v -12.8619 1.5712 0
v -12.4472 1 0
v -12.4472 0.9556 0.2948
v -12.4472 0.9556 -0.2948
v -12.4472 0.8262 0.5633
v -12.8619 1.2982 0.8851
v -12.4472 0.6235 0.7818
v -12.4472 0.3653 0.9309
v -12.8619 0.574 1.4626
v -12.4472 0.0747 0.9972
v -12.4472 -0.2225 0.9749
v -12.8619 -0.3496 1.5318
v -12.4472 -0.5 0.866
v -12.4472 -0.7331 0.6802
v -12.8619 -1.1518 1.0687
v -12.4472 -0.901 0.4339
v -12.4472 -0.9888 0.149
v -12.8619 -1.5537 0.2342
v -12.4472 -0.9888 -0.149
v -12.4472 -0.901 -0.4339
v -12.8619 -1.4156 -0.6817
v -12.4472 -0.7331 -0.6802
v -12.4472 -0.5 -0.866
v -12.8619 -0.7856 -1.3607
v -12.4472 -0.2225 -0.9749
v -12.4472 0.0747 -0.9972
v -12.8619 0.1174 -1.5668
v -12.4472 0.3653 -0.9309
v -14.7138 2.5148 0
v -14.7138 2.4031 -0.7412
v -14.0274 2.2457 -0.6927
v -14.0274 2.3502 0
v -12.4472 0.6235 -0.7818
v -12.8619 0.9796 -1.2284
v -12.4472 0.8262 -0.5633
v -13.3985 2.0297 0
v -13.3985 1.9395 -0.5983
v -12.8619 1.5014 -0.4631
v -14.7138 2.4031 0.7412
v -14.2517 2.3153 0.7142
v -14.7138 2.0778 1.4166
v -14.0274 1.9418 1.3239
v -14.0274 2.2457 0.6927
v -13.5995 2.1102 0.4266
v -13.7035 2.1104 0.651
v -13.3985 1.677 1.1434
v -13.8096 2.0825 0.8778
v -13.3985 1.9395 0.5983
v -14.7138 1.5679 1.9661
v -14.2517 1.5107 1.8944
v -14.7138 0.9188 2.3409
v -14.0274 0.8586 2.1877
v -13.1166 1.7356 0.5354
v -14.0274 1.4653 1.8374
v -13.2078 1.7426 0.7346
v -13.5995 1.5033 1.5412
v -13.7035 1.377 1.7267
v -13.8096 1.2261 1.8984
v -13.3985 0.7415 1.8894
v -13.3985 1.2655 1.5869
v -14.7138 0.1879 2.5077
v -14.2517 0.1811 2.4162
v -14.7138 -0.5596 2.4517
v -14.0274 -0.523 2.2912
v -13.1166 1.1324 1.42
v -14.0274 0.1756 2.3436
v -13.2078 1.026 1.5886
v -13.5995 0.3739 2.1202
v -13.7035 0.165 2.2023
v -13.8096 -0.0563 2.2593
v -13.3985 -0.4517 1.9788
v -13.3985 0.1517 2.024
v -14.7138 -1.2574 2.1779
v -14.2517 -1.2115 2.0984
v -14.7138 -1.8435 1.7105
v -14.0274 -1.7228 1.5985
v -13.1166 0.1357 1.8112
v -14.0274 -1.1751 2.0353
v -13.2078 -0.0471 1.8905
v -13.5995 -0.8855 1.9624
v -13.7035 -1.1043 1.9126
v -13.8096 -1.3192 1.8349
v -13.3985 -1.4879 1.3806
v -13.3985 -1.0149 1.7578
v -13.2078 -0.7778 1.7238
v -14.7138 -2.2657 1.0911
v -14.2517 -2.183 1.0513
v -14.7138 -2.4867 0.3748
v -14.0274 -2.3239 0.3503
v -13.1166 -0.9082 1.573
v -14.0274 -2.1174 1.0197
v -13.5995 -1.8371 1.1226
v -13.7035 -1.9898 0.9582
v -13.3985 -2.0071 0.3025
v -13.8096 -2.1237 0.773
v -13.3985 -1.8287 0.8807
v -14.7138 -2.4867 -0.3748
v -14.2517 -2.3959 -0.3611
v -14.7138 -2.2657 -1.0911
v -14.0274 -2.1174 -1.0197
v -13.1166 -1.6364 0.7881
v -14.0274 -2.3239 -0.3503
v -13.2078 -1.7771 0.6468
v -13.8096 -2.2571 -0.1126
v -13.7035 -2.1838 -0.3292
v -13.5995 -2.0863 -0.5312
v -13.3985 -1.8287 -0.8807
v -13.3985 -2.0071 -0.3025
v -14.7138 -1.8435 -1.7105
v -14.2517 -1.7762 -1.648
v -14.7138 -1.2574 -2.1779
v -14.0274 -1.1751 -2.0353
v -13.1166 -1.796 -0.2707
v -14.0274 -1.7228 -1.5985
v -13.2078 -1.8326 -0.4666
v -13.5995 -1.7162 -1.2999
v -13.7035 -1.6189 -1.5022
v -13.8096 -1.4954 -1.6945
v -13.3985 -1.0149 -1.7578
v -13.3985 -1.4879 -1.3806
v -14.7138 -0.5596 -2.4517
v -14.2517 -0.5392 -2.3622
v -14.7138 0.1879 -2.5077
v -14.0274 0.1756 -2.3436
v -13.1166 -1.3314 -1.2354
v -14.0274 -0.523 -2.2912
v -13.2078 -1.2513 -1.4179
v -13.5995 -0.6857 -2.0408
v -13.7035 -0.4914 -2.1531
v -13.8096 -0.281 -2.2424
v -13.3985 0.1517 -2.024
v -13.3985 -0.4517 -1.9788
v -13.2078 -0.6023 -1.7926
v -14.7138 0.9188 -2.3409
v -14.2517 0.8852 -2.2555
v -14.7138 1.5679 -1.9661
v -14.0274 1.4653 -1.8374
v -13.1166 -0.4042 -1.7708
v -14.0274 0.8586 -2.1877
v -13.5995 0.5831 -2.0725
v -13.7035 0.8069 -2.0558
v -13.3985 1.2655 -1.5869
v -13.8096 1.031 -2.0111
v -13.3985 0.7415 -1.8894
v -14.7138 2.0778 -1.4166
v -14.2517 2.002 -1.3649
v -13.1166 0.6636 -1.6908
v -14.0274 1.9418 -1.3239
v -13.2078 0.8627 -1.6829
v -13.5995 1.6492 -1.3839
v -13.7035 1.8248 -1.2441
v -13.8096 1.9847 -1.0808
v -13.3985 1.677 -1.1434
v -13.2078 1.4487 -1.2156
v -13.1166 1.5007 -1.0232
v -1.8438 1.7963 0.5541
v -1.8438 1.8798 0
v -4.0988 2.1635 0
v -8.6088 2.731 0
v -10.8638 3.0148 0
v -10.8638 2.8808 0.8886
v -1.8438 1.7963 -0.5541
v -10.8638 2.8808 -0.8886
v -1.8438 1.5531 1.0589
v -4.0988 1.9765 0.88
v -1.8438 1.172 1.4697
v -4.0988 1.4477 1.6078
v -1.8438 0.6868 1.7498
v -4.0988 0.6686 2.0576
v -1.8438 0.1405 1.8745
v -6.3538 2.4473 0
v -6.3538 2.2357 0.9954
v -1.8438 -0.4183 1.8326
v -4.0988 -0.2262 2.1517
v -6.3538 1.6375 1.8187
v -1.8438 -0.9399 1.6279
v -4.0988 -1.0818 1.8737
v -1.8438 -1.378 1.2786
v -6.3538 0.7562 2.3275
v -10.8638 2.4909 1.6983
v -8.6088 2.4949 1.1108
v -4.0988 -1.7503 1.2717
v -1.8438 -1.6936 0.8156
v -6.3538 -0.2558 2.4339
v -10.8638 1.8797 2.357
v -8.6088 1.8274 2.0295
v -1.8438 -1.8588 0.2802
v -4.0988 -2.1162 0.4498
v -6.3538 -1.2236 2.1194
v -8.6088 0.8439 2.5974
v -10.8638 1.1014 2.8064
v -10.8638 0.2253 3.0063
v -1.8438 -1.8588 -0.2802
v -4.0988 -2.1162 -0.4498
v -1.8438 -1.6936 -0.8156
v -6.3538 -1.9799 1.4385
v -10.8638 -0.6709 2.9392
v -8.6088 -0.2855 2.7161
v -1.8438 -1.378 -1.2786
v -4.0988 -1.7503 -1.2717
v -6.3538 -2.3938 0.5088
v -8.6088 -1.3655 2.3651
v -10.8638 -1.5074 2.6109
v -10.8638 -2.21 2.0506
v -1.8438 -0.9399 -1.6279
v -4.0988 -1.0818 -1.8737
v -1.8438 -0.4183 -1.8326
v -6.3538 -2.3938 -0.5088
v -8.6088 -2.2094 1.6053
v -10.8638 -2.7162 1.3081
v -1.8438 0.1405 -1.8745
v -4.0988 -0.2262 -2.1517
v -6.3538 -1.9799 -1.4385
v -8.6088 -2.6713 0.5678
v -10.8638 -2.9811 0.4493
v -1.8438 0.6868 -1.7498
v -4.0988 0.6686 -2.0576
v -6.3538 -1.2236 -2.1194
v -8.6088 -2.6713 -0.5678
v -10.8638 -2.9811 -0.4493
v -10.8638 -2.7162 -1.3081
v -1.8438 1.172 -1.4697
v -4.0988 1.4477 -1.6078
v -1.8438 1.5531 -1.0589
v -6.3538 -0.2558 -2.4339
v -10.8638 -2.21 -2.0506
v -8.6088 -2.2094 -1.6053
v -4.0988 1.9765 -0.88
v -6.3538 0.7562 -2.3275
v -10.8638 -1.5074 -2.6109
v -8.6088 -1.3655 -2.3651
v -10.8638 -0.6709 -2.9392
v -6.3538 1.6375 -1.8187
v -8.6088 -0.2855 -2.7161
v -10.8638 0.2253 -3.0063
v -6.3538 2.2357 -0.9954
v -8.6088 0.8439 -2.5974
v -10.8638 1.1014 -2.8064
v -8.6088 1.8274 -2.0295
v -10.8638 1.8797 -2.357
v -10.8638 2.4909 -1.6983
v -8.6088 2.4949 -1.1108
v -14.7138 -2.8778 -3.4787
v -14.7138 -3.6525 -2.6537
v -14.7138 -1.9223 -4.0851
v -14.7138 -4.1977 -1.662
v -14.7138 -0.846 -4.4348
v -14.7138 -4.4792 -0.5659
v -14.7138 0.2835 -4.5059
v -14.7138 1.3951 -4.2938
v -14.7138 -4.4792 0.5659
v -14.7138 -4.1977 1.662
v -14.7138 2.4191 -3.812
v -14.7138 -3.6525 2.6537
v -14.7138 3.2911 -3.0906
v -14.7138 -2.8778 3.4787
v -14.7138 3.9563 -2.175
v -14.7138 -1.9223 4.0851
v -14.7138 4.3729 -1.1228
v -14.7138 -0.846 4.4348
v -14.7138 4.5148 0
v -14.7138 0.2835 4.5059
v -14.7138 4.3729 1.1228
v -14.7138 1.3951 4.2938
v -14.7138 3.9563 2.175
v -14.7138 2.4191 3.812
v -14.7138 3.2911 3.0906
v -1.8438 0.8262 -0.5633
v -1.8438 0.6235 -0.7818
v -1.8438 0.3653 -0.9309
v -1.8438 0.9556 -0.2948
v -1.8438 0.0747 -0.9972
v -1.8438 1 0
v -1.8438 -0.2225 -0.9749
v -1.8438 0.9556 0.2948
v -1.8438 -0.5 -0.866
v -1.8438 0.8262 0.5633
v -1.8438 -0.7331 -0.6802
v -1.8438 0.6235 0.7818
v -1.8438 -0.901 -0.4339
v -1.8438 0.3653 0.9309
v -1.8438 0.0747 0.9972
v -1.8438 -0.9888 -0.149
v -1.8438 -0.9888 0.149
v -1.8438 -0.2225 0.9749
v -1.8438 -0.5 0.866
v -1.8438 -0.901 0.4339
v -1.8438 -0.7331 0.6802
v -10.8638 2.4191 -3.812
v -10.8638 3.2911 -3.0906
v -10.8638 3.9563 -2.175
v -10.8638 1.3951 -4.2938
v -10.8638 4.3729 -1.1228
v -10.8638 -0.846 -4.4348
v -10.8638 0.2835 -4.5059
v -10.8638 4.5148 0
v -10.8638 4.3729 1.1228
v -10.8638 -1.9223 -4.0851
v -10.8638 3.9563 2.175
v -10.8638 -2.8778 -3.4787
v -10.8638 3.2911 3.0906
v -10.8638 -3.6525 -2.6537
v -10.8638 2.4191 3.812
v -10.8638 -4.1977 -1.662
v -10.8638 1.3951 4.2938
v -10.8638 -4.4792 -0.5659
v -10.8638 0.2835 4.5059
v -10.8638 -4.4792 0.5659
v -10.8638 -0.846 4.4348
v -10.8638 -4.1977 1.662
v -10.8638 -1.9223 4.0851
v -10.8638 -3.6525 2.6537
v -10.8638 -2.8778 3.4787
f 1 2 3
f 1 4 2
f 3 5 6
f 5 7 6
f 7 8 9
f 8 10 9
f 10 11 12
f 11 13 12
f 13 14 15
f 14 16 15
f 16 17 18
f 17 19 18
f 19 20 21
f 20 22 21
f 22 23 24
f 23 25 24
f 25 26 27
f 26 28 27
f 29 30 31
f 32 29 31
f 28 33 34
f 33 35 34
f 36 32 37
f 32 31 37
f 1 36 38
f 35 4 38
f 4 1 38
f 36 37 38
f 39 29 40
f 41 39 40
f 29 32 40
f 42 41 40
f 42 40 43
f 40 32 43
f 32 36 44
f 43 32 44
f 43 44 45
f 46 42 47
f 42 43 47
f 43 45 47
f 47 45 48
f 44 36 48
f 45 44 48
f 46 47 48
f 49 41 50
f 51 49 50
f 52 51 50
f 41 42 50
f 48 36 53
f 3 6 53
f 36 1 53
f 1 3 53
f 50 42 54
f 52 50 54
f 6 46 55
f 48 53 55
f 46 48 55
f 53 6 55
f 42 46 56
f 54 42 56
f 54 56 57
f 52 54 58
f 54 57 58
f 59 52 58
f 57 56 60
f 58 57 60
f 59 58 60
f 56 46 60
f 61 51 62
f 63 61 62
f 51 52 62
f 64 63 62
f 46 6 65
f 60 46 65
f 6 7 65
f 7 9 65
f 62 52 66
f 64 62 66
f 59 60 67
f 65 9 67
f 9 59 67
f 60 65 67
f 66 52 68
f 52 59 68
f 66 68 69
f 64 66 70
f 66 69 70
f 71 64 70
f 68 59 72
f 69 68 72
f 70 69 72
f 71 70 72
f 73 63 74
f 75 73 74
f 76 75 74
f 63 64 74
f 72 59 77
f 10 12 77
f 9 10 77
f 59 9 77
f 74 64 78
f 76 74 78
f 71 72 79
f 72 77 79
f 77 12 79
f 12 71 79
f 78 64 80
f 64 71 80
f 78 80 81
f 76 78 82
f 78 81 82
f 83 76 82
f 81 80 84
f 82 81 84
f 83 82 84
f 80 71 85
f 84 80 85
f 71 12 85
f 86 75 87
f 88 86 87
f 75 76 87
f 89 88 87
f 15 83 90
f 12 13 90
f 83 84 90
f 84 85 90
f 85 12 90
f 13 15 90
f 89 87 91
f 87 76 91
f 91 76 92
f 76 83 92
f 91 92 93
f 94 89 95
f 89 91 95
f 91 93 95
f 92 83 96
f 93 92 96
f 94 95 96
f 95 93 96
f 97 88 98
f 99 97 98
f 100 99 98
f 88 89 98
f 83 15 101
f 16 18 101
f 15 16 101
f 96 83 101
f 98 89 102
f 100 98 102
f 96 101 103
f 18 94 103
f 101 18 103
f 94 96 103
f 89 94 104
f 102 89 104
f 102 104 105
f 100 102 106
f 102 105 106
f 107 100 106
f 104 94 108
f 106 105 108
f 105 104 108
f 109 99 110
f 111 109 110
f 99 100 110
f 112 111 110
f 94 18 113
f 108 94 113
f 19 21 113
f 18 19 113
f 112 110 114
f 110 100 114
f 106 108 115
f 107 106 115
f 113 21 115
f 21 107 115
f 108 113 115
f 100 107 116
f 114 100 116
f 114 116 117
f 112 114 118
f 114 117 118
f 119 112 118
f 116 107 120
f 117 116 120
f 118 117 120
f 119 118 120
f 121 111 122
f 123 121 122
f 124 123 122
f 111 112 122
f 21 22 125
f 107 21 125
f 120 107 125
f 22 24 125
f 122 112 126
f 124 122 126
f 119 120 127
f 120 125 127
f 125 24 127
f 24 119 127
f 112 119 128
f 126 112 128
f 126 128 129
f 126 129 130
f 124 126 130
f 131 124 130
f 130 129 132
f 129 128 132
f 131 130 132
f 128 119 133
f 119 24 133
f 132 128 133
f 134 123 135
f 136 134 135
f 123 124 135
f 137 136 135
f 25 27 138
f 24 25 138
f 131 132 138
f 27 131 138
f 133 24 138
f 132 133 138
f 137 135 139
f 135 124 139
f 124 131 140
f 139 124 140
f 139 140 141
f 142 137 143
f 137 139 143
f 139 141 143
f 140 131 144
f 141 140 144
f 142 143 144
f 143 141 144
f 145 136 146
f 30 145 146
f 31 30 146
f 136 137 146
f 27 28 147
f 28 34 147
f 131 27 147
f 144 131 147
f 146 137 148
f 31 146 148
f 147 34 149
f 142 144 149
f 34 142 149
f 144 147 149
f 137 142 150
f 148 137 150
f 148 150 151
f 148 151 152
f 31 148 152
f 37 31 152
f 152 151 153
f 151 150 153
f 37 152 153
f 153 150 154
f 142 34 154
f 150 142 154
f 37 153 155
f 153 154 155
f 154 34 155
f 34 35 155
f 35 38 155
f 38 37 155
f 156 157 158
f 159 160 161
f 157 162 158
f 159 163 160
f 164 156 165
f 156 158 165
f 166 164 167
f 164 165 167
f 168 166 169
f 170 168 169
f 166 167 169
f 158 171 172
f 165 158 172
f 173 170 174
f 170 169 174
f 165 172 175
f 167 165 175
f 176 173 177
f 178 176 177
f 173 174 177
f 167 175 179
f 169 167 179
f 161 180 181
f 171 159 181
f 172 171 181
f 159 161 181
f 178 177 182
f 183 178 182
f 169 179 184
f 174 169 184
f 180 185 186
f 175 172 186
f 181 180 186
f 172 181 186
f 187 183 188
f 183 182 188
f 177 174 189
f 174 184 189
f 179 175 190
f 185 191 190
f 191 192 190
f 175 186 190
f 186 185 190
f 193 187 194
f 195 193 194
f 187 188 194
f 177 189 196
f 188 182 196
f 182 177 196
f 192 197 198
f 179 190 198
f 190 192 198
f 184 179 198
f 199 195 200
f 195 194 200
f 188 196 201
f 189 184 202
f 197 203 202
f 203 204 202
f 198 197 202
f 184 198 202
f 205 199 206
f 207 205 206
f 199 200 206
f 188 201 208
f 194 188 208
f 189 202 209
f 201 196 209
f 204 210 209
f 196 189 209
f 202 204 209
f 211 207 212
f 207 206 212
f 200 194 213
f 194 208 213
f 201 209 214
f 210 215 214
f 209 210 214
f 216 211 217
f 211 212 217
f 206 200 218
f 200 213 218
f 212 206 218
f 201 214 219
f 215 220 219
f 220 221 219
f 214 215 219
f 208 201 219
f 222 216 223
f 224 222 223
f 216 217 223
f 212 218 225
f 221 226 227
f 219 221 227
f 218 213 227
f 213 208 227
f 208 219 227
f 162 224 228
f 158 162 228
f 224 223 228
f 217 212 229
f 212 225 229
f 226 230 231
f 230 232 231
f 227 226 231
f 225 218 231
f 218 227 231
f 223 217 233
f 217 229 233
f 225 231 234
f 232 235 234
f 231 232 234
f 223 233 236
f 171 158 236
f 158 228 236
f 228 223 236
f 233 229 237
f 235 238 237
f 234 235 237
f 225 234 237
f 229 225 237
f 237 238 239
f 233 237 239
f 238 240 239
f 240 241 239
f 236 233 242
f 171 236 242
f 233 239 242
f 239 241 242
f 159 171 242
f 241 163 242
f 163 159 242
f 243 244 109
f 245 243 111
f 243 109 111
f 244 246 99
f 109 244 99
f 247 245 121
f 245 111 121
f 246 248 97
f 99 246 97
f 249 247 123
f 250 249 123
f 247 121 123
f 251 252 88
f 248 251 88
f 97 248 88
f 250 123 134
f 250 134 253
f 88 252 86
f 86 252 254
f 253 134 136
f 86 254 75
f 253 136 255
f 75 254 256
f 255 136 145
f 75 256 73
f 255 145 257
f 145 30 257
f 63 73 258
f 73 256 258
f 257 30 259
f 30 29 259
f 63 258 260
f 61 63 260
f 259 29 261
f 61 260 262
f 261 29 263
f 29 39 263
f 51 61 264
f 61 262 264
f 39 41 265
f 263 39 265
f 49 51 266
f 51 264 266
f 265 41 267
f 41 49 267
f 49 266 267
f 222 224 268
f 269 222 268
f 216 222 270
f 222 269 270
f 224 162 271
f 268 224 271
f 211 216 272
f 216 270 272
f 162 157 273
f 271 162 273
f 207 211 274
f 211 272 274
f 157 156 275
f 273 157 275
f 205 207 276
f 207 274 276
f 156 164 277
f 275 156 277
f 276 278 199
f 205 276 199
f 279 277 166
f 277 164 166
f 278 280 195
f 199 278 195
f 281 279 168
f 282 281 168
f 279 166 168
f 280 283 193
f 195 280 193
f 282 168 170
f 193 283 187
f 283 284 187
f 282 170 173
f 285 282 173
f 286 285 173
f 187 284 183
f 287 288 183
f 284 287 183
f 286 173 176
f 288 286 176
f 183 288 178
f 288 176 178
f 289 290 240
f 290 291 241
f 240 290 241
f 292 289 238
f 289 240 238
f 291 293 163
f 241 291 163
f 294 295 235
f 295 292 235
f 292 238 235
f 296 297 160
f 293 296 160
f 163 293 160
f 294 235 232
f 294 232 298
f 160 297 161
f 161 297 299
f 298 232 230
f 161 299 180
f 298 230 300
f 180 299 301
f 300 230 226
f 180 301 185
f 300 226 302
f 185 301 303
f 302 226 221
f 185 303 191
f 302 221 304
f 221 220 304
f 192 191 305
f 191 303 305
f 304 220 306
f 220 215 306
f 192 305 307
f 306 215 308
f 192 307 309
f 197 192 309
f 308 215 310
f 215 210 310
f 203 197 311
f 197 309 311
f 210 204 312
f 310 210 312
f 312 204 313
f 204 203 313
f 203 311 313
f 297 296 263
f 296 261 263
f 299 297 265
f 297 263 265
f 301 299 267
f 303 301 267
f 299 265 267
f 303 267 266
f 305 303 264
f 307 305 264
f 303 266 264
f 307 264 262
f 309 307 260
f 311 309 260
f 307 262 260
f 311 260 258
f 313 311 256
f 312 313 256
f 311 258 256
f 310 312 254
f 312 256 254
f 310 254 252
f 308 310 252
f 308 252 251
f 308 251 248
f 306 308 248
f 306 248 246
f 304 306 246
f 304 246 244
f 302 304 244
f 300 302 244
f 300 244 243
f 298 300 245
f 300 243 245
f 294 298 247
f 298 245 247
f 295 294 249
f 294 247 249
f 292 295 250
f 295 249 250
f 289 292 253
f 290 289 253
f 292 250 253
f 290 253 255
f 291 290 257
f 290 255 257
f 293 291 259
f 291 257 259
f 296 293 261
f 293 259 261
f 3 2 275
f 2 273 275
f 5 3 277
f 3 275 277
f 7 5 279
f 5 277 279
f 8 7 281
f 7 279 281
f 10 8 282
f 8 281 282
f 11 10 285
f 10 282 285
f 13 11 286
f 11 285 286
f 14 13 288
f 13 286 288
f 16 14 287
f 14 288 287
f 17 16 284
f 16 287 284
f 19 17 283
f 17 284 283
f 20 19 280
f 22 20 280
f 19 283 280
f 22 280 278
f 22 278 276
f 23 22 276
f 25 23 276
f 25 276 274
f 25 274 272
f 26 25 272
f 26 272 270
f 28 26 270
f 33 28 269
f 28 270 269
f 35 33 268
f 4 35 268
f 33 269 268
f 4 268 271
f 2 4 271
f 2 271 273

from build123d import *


with BuildPart() as f1:
    # F0 (on Top) → F1 (revolve)
    with BuildSketch(Plane.XY):
        with BuildLine():
            Line((-10.863817, 4.514776), (-14.713817, 4.514776))
            Line((-14.713817, 4.514776), (-14.713817, 2.514776))
            ThreePointArc((-14.713817, 2.514776), (-13.398503, 2.029725), (-12.447191, 1))
            Line((-12.447191, 1), (-1.843817, 1))
            Line((-1.843817, 1), (-1.843817, 1.879776))
            Line((-1.843817, 1.879776), (-10.863817, 3.014776))
            Line((-10.863817, 3.014776), (-10.863817, 4.514776))
        make_face()
    revolve(axis=Axis((-25.231563, 0, 0), (1, 0, 0)))


solid = f1.part
